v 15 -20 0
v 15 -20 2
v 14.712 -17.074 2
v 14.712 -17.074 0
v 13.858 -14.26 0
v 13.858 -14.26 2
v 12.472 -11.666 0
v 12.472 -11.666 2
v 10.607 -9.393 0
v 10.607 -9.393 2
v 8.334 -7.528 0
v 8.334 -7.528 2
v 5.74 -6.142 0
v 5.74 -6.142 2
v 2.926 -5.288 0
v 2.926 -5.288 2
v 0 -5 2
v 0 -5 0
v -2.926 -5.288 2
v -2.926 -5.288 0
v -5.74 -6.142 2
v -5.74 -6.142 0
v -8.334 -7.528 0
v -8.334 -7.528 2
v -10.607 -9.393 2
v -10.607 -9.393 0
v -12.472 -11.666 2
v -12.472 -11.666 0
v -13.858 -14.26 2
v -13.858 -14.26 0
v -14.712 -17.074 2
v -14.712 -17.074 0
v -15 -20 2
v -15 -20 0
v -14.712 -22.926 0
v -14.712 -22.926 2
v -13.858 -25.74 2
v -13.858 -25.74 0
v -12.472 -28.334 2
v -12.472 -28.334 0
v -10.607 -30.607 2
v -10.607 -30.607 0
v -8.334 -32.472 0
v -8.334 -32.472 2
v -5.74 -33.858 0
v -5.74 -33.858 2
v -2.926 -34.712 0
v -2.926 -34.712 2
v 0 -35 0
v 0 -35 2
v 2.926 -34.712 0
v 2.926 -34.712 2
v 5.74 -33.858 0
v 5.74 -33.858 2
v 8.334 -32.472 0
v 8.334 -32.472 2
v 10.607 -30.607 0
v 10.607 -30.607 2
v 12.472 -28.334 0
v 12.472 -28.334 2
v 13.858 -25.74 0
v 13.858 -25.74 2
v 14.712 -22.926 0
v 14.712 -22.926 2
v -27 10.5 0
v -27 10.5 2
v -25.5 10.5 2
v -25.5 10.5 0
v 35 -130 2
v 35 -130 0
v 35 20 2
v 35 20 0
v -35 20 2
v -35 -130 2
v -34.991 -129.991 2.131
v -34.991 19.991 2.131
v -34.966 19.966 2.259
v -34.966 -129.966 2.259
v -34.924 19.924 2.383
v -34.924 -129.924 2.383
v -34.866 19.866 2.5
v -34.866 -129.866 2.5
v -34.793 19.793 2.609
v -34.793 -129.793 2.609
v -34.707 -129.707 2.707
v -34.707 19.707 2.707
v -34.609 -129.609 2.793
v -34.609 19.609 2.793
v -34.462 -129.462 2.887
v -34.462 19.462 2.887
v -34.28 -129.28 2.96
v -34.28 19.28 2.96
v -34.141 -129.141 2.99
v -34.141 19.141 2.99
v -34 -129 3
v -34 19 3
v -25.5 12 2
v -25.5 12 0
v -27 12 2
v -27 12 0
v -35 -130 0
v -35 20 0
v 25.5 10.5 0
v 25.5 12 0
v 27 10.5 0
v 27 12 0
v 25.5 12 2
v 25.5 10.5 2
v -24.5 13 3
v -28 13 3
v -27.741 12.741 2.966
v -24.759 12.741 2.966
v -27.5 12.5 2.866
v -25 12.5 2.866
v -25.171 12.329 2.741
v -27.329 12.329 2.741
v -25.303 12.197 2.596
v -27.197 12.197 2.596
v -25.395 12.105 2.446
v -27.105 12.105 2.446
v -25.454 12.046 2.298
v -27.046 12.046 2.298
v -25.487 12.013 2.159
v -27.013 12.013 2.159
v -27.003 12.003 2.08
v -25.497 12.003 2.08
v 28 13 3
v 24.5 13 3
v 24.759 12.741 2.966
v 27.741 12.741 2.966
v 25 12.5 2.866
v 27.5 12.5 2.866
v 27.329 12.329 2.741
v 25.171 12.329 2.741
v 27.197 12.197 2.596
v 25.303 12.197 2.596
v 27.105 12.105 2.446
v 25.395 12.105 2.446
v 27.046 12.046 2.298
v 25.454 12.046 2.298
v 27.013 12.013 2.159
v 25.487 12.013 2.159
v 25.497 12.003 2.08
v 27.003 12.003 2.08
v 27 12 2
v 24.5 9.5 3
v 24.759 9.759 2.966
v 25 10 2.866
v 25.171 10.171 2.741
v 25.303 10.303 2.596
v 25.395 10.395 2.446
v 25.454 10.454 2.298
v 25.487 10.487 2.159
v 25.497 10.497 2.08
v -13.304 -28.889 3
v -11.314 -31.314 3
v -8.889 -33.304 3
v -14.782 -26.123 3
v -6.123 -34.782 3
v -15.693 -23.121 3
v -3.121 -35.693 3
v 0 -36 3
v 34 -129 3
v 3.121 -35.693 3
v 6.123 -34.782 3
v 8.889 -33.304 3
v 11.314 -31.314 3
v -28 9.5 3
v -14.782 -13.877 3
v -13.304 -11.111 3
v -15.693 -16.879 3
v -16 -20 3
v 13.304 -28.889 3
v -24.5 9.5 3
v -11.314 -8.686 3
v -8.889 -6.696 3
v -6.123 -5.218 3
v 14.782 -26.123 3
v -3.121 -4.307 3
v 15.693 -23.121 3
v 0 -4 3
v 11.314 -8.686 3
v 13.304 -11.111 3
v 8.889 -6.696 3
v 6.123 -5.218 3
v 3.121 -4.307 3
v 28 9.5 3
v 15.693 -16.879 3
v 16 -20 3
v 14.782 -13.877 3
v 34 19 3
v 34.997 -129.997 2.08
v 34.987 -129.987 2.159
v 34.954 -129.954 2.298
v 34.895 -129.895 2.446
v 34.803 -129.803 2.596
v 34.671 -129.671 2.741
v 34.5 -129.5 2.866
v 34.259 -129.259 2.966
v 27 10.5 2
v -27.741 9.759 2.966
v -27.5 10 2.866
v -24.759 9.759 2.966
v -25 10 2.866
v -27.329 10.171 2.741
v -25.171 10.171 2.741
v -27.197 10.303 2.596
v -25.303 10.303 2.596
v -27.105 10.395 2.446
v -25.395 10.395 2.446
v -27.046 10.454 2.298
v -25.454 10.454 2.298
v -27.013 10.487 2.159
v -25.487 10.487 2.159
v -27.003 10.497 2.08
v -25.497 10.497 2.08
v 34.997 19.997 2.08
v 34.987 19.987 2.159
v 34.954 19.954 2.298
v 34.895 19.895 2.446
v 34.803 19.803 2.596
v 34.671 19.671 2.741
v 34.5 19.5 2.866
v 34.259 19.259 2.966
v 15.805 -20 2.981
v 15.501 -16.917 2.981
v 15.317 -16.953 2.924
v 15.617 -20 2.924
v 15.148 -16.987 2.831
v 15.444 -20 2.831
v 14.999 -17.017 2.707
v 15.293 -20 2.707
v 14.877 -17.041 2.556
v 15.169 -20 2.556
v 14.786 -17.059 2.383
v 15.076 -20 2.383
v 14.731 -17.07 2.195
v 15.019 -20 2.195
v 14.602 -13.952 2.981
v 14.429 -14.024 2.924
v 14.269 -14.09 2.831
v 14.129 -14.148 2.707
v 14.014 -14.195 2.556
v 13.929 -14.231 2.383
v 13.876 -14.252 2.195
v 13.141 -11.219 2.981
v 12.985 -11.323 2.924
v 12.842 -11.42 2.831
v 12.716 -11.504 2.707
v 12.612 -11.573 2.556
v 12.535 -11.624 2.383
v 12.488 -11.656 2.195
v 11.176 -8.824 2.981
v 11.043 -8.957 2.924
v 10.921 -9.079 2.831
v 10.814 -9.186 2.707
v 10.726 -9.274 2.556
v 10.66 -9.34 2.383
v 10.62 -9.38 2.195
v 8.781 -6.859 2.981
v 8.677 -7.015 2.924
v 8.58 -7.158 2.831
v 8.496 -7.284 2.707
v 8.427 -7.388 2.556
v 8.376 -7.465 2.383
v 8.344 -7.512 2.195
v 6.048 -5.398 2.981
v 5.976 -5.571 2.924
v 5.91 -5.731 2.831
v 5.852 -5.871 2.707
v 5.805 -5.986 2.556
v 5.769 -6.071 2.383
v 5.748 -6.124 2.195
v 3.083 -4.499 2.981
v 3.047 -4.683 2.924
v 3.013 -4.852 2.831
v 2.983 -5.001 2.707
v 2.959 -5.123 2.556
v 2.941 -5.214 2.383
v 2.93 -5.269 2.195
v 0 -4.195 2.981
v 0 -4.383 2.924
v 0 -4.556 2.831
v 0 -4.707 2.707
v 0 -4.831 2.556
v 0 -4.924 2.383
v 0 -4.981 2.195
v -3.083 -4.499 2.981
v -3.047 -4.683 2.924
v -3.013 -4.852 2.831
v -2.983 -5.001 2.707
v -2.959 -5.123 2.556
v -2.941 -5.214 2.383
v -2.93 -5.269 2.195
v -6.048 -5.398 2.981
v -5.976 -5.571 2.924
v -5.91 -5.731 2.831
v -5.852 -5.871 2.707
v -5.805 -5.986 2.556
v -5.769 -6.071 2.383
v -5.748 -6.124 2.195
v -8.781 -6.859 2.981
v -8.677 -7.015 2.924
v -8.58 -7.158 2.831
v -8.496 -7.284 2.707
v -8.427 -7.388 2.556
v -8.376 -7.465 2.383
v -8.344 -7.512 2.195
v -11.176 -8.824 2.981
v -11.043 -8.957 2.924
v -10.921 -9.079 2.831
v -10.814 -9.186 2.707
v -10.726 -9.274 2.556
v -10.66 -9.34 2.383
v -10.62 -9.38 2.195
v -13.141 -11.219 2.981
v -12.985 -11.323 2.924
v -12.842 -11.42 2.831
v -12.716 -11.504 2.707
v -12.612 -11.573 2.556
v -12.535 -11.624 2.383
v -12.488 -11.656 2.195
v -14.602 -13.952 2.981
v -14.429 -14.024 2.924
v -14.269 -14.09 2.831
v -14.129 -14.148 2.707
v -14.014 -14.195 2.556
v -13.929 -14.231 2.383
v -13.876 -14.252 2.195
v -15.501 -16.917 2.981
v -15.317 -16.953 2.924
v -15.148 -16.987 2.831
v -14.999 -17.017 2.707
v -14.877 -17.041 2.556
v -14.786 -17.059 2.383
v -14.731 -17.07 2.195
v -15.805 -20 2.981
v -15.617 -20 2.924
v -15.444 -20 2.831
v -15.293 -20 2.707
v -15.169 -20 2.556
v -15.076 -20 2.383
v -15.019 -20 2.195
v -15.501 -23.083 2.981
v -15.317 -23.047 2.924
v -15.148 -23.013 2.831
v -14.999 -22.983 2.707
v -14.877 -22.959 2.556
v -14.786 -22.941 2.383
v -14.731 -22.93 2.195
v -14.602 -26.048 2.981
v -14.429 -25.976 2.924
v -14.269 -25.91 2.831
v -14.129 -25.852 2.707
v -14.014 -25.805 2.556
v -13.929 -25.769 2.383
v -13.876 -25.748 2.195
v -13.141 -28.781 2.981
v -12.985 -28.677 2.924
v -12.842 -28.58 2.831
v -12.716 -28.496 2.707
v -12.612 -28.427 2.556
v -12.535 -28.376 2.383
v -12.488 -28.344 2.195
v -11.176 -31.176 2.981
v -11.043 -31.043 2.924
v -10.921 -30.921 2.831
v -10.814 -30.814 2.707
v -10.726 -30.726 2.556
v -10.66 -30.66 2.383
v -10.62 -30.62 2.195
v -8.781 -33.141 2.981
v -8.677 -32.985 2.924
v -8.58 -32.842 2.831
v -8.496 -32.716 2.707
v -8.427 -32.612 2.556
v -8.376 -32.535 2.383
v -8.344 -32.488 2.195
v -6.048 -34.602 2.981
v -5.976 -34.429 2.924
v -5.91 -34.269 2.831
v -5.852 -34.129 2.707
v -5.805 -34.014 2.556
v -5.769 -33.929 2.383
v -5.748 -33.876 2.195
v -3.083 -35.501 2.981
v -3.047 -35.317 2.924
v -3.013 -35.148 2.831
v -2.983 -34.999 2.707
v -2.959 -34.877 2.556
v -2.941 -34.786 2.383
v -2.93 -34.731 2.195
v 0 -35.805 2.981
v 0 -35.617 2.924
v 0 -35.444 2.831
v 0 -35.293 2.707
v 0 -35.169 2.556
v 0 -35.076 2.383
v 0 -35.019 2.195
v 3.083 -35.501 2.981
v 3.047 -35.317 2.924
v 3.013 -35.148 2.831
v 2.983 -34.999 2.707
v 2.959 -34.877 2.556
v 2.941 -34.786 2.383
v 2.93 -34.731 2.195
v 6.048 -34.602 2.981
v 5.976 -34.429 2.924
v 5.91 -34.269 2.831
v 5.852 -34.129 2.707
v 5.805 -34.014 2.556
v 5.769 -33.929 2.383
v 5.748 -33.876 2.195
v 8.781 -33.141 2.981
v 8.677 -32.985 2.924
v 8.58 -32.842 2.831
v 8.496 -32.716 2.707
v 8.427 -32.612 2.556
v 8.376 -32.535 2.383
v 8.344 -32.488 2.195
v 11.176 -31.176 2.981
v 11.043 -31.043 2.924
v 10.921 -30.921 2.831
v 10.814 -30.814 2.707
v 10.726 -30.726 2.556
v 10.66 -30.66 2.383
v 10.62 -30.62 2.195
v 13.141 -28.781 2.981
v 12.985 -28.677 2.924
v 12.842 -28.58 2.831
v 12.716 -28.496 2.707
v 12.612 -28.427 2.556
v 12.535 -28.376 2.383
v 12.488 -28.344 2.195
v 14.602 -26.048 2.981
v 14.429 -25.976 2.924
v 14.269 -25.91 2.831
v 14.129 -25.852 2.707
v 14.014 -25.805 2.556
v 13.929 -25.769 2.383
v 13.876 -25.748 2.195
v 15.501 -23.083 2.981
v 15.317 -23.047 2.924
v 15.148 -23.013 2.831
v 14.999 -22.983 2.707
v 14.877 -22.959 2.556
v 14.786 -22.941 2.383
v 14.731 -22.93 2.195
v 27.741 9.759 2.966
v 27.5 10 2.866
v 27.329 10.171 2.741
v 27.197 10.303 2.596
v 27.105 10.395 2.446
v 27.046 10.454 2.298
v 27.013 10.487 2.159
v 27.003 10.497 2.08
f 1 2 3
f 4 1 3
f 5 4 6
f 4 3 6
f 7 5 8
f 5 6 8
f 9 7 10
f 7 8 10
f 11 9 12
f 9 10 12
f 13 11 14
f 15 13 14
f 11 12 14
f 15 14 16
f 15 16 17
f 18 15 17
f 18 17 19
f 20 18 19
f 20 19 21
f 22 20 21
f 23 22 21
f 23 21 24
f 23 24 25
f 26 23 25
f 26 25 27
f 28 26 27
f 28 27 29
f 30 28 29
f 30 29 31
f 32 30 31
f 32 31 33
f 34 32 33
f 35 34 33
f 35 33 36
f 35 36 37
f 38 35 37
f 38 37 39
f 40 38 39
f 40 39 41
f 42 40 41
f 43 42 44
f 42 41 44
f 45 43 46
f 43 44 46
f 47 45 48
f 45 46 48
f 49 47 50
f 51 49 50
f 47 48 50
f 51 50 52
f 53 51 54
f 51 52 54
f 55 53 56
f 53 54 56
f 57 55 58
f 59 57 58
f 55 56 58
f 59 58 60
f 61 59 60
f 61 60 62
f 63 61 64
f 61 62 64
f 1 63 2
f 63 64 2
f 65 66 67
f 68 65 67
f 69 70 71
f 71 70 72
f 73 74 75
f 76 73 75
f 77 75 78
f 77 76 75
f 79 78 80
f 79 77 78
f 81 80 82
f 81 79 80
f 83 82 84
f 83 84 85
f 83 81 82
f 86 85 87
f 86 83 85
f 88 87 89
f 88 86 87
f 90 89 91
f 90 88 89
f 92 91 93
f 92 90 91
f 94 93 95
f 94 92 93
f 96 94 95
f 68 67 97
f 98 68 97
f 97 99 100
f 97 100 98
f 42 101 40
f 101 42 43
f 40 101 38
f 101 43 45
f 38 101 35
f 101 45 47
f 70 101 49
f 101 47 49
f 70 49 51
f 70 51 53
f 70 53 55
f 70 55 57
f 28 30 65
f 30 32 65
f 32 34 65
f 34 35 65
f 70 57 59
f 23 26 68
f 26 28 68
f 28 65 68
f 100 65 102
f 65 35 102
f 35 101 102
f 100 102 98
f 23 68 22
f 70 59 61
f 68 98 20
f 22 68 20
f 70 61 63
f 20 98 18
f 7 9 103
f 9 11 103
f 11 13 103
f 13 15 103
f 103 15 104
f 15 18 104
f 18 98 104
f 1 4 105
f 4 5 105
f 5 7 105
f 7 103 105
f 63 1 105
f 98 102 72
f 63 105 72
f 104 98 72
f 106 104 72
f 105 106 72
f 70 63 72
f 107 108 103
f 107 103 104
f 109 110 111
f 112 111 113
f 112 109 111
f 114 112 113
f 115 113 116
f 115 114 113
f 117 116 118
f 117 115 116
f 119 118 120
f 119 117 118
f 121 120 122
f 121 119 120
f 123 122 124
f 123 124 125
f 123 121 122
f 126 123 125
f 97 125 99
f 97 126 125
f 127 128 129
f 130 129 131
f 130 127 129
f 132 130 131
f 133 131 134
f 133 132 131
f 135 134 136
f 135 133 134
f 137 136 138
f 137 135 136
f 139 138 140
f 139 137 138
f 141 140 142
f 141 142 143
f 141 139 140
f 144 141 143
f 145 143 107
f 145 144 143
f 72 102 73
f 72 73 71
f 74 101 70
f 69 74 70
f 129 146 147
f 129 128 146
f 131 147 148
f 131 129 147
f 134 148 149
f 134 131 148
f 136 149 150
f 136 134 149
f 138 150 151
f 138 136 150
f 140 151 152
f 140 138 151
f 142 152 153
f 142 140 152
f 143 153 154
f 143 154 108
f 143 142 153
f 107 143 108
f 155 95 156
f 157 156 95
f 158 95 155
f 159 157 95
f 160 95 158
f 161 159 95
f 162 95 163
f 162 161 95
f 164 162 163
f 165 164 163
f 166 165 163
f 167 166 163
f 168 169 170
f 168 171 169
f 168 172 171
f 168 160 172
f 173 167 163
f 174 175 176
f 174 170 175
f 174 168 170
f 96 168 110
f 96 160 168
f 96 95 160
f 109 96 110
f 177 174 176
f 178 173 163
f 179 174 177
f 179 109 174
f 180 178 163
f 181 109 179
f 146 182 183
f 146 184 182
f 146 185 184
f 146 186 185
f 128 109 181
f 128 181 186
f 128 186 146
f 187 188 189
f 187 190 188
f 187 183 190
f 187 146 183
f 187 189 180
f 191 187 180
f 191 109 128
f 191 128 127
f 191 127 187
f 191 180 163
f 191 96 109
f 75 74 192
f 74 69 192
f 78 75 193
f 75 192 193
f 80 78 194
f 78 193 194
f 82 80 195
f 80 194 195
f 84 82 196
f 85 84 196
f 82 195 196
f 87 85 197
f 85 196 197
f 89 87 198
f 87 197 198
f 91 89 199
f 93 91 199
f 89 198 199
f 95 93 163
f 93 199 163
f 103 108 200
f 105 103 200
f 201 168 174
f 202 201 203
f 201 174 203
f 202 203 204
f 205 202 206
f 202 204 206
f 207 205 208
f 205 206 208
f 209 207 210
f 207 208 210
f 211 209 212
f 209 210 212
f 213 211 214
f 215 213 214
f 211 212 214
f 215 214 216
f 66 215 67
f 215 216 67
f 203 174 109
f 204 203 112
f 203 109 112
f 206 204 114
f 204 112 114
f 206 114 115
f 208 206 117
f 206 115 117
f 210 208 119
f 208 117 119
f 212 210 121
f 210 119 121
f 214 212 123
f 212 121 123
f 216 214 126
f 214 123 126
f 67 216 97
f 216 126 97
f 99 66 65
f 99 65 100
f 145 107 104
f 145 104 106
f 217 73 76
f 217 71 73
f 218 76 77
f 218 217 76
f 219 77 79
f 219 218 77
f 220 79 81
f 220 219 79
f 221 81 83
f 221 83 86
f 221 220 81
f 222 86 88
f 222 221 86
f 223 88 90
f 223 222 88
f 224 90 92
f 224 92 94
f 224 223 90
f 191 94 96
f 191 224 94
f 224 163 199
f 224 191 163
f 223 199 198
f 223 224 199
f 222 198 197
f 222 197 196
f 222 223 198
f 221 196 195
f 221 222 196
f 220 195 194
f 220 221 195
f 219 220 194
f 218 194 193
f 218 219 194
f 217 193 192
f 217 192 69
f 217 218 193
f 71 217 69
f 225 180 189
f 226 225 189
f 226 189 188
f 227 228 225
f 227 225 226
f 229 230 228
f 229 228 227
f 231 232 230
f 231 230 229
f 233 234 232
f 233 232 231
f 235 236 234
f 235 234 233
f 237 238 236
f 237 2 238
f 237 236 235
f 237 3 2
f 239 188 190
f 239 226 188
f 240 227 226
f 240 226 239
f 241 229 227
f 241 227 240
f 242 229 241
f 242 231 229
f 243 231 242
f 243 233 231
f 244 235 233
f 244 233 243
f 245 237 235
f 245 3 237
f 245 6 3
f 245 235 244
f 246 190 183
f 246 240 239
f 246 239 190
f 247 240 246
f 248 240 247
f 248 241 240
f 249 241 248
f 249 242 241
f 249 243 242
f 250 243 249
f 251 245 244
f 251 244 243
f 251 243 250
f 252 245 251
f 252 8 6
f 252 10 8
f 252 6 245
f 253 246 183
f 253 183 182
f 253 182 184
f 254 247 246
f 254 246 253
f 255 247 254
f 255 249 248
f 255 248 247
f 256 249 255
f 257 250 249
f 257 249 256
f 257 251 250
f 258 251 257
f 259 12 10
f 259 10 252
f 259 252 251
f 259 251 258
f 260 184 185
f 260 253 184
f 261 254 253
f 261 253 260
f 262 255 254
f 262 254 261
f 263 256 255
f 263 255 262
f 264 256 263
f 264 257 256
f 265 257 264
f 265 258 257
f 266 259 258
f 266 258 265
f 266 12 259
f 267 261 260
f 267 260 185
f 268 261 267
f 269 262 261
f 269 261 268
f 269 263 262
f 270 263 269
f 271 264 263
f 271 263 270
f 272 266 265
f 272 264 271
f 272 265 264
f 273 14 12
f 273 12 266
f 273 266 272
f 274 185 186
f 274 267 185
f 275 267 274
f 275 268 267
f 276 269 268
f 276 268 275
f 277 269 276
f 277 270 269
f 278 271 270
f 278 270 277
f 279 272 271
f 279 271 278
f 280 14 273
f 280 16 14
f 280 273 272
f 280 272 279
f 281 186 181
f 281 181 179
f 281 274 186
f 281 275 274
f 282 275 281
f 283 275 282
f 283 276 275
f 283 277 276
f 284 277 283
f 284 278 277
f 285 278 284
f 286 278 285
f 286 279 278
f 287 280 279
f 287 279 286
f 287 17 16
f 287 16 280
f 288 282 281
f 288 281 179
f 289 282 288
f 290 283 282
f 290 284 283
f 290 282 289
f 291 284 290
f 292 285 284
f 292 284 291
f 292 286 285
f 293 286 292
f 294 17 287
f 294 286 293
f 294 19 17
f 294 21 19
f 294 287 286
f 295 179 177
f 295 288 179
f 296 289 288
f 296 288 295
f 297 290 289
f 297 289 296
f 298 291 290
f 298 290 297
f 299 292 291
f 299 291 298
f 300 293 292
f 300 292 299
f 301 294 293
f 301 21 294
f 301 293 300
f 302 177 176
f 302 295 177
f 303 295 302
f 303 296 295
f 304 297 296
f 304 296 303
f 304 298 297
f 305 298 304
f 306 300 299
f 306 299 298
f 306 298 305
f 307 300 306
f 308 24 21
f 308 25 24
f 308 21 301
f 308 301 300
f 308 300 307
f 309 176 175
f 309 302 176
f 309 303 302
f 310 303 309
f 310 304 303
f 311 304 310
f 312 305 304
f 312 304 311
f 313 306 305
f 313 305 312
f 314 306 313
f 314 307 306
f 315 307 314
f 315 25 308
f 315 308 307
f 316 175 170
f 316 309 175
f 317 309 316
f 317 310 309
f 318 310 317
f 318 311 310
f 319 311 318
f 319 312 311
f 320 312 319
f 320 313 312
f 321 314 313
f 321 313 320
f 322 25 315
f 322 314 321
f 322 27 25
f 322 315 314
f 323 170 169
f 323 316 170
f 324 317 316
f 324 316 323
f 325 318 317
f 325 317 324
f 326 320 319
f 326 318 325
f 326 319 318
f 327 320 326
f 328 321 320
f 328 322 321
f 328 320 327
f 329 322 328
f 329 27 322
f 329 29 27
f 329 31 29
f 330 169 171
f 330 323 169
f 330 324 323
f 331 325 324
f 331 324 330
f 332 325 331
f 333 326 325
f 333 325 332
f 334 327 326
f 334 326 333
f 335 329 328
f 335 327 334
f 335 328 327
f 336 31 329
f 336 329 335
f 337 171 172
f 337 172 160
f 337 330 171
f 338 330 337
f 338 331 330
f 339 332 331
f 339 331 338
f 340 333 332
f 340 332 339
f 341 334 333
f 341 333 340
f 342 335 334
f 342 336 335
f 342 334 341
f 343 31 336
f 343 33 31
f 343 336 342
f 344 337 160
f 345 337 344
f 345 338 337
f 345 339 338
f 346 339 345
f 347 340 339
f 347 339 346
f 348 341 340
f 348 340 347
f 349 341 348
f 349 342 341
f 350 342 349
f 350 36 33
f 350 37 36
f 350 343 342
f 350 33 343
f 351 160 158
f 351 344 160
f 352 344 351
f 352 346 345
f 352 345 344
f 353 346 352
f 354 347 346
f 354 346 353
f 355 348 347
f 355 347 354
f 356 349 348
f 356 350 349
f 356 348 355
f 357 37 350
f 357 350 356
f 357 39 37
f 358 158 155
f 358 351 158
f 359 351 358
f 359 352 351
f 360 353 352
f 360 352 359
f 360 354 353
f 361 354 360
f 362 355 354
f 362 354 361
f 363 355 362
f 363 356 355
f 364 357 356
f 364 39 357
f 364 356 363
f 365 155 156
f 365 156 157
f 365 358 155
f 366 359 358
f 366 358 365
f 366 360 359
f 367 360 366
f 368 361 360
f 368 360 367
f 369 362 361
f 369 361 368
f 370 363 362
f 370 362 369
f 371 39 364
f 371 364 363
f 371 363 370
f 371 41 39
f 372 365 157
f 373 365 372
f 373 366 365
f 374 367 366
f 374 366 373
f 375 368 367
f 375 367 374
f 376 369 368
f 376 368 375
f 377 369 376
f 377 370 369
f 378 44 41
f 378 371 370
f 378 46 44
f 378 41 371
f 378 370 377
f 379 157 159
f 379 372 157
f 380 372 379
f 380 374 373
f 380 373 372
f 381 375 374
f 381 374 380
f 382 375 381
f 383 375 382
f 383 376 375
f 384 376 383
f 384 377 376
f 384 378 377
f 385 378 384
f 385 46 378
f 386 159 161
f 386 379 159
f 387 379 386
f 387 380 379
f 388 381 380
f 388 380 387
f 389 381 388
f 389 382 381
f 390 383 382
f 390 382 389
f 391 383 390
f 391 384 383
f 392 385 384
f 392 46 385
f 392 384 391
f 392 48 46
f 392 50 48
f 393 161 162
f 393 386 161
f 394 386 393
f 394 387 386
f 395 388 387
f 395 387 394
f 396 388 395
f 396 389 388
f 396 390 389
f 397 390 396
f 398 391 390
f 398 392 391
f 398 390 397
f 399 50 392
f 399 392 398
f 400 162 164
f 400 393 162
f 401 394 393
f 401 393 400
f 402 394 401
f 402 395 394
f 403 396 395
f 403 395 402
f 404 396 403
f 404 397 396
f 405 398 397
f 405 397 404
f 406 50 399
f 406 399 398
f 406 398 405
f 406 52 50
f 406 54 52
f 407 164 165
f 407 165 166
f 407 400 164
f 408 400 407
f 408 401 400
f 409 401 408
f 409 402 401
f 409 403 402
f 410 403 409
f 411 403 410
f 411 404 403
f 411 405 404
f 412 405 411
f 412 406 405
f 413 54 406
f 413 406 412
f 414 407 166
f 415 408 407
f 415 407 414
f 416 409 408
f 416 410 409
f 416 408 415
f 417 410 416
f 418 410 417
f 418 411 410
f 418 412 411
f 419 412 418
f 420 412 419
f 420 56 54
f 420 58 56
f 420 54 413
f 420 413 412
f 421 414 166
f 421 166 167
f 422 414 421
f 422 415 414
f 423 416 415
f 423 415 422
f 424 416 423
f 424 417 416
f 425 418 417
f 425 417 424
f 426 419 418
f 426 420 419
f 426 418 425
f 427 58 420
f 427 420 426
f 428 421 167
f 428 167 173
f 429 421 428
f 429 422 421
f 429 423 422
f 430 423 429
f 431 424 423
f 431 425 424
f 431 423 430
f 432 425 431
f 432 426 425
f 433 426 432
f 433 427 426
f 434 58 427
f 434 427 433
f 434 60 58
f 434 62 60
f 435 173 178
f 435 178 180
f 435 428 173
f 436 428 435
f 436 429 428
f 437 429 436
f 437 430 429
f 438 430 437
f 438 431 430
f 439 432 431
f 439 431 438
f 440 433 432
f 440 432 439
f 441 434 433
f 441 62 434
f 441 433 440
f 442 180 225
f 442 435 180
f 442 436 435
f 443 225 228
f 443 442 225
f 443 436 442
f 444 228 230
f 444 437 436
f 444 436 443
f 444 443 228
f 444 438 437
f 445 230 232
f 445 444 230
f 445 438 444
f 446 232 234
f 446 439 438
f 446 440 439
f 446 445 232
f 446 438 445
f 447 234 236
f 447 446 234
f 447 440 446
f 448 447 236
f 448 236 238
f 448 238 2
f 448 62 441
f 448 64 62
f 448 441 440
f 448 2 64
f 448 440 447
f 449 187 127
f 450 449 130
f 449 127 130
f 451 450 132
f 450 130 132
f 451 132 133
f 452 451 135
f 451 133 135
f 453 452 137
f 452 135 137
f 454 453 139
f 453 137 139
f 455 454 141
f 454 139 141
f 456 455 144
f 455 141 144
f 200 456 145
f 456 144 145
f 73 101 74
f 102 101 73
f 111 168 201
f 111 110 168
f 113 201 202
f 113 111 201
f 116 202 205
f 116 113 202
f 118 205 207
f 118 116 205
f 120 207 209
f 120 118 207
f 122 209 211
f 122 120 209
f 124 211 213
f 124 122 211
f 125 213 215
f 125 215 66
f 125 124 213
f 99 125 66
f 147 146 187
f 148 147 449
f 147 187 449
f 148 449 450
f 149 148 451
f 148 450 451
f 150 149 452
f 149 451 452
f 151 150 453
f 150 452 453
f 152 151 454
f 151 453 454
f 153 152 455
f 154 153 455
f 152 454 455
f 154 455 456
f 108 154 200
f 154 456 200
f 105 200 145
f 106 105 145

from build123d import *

# Parameters (mm, degrees)
SKETCH1_W      = 70
SKETCH1_H      = 150
EXTRUDE1_DEPTH = 3
EXTRUDE2_REACH = 5
SKETCH2_R      = 15
EXTRUDE3_REACH = 5
SKETCH4_W      = 1.5
SKETCH4_H      = 1.5
FILLET1_R      = 1


with BuildPart() as part:
    # Sketch1 → Extrude1 (new body)
    with BuildSketch(Plane.XY):
        with Locations((0, -55)):
            Rectangle(SKETCH1_W, SKETCH1_H)
    extrude(amount=EXTRUDE1_DEPTH)

    # Sketch2 → Extrude2 (cut, up to next)
    with BuildSketch(Plane.XY.offset(3), mode=Mode.PRIVATE) as extrude2_sk1:
        with Locations((0, -20)):
            Circle(SKETCH2_R)
    extrude2_tool1 = extrude(extrude2_sk1.sketch, amount=-EXTRUDE2_REACH, mode=Mode.PRIVATE) & part.part
    add(extrude2_tool1.solids().sort_by_distance((0, -20, 3))[0], mode=Mode.SUBTRACT)

    # Sketch4 → Extrude3 (cut, up to next)
    with BuildSketch(Plane.XY.offset(3), mode=Mode.PRIVATE) as extrude3_sk1:
        with Locations((-26.25, 11.25)):
            Rectangle(SKETCH4_W, SKETCH4_H)
    extrude3_tool1 = extrude(extrude3_sk1.sketch, amount=-EXTRUDE3_REACH, mode=Mode.PRIVATE) & part.part
    add(extrude3_tool1.solids().sort_by_distance((-26.25, 11.25, 3))[0], mode=Mode.SUBTRACT)
    # Sketch4 → Extrude3 (cut, up to next)
    with BuildSketch(Plane.XY.offset(3), mode=Mode.PRIVATE) as extrude3_sk2:
        with Locations((26.25, 11.25)):
            Rectangle(SKETCH4_W, SKETCH4_H)
    extrude3_tool2 = extrude(extrude3_sk2.sketch, amount=-EXTRUDE3_REACH, mode=Mode.PRIVATE) & part.part
    add(extrude3_tool2.solids().sort_by_distance((26.25, 11.25, 3))[0], mode=Mode.SUBTRACT)

    # Fillet1
    fillet1_edges = [part.edges().sort_by_distance(p)[0] for p in [
        (35, -55, 3),
        (0, 20, 3),
        (-15, -20, 3),
        (-27, 11.25, 3),
        (-26.25, 10.5, 3),
        (-25.5, 11.25, 3),
        (-26.25, 12, 3),
        (25.5, 11.25, 3),
        (26.25, 10.5, 3),
        (27, 11.25, 3),
        (26.25, 12, 3),
        (-35, -55, 3),
        (0, -130, 3),
    ]]
    fillet(fillet1_edges, radius=FILLET1_R)


solid = part.part
